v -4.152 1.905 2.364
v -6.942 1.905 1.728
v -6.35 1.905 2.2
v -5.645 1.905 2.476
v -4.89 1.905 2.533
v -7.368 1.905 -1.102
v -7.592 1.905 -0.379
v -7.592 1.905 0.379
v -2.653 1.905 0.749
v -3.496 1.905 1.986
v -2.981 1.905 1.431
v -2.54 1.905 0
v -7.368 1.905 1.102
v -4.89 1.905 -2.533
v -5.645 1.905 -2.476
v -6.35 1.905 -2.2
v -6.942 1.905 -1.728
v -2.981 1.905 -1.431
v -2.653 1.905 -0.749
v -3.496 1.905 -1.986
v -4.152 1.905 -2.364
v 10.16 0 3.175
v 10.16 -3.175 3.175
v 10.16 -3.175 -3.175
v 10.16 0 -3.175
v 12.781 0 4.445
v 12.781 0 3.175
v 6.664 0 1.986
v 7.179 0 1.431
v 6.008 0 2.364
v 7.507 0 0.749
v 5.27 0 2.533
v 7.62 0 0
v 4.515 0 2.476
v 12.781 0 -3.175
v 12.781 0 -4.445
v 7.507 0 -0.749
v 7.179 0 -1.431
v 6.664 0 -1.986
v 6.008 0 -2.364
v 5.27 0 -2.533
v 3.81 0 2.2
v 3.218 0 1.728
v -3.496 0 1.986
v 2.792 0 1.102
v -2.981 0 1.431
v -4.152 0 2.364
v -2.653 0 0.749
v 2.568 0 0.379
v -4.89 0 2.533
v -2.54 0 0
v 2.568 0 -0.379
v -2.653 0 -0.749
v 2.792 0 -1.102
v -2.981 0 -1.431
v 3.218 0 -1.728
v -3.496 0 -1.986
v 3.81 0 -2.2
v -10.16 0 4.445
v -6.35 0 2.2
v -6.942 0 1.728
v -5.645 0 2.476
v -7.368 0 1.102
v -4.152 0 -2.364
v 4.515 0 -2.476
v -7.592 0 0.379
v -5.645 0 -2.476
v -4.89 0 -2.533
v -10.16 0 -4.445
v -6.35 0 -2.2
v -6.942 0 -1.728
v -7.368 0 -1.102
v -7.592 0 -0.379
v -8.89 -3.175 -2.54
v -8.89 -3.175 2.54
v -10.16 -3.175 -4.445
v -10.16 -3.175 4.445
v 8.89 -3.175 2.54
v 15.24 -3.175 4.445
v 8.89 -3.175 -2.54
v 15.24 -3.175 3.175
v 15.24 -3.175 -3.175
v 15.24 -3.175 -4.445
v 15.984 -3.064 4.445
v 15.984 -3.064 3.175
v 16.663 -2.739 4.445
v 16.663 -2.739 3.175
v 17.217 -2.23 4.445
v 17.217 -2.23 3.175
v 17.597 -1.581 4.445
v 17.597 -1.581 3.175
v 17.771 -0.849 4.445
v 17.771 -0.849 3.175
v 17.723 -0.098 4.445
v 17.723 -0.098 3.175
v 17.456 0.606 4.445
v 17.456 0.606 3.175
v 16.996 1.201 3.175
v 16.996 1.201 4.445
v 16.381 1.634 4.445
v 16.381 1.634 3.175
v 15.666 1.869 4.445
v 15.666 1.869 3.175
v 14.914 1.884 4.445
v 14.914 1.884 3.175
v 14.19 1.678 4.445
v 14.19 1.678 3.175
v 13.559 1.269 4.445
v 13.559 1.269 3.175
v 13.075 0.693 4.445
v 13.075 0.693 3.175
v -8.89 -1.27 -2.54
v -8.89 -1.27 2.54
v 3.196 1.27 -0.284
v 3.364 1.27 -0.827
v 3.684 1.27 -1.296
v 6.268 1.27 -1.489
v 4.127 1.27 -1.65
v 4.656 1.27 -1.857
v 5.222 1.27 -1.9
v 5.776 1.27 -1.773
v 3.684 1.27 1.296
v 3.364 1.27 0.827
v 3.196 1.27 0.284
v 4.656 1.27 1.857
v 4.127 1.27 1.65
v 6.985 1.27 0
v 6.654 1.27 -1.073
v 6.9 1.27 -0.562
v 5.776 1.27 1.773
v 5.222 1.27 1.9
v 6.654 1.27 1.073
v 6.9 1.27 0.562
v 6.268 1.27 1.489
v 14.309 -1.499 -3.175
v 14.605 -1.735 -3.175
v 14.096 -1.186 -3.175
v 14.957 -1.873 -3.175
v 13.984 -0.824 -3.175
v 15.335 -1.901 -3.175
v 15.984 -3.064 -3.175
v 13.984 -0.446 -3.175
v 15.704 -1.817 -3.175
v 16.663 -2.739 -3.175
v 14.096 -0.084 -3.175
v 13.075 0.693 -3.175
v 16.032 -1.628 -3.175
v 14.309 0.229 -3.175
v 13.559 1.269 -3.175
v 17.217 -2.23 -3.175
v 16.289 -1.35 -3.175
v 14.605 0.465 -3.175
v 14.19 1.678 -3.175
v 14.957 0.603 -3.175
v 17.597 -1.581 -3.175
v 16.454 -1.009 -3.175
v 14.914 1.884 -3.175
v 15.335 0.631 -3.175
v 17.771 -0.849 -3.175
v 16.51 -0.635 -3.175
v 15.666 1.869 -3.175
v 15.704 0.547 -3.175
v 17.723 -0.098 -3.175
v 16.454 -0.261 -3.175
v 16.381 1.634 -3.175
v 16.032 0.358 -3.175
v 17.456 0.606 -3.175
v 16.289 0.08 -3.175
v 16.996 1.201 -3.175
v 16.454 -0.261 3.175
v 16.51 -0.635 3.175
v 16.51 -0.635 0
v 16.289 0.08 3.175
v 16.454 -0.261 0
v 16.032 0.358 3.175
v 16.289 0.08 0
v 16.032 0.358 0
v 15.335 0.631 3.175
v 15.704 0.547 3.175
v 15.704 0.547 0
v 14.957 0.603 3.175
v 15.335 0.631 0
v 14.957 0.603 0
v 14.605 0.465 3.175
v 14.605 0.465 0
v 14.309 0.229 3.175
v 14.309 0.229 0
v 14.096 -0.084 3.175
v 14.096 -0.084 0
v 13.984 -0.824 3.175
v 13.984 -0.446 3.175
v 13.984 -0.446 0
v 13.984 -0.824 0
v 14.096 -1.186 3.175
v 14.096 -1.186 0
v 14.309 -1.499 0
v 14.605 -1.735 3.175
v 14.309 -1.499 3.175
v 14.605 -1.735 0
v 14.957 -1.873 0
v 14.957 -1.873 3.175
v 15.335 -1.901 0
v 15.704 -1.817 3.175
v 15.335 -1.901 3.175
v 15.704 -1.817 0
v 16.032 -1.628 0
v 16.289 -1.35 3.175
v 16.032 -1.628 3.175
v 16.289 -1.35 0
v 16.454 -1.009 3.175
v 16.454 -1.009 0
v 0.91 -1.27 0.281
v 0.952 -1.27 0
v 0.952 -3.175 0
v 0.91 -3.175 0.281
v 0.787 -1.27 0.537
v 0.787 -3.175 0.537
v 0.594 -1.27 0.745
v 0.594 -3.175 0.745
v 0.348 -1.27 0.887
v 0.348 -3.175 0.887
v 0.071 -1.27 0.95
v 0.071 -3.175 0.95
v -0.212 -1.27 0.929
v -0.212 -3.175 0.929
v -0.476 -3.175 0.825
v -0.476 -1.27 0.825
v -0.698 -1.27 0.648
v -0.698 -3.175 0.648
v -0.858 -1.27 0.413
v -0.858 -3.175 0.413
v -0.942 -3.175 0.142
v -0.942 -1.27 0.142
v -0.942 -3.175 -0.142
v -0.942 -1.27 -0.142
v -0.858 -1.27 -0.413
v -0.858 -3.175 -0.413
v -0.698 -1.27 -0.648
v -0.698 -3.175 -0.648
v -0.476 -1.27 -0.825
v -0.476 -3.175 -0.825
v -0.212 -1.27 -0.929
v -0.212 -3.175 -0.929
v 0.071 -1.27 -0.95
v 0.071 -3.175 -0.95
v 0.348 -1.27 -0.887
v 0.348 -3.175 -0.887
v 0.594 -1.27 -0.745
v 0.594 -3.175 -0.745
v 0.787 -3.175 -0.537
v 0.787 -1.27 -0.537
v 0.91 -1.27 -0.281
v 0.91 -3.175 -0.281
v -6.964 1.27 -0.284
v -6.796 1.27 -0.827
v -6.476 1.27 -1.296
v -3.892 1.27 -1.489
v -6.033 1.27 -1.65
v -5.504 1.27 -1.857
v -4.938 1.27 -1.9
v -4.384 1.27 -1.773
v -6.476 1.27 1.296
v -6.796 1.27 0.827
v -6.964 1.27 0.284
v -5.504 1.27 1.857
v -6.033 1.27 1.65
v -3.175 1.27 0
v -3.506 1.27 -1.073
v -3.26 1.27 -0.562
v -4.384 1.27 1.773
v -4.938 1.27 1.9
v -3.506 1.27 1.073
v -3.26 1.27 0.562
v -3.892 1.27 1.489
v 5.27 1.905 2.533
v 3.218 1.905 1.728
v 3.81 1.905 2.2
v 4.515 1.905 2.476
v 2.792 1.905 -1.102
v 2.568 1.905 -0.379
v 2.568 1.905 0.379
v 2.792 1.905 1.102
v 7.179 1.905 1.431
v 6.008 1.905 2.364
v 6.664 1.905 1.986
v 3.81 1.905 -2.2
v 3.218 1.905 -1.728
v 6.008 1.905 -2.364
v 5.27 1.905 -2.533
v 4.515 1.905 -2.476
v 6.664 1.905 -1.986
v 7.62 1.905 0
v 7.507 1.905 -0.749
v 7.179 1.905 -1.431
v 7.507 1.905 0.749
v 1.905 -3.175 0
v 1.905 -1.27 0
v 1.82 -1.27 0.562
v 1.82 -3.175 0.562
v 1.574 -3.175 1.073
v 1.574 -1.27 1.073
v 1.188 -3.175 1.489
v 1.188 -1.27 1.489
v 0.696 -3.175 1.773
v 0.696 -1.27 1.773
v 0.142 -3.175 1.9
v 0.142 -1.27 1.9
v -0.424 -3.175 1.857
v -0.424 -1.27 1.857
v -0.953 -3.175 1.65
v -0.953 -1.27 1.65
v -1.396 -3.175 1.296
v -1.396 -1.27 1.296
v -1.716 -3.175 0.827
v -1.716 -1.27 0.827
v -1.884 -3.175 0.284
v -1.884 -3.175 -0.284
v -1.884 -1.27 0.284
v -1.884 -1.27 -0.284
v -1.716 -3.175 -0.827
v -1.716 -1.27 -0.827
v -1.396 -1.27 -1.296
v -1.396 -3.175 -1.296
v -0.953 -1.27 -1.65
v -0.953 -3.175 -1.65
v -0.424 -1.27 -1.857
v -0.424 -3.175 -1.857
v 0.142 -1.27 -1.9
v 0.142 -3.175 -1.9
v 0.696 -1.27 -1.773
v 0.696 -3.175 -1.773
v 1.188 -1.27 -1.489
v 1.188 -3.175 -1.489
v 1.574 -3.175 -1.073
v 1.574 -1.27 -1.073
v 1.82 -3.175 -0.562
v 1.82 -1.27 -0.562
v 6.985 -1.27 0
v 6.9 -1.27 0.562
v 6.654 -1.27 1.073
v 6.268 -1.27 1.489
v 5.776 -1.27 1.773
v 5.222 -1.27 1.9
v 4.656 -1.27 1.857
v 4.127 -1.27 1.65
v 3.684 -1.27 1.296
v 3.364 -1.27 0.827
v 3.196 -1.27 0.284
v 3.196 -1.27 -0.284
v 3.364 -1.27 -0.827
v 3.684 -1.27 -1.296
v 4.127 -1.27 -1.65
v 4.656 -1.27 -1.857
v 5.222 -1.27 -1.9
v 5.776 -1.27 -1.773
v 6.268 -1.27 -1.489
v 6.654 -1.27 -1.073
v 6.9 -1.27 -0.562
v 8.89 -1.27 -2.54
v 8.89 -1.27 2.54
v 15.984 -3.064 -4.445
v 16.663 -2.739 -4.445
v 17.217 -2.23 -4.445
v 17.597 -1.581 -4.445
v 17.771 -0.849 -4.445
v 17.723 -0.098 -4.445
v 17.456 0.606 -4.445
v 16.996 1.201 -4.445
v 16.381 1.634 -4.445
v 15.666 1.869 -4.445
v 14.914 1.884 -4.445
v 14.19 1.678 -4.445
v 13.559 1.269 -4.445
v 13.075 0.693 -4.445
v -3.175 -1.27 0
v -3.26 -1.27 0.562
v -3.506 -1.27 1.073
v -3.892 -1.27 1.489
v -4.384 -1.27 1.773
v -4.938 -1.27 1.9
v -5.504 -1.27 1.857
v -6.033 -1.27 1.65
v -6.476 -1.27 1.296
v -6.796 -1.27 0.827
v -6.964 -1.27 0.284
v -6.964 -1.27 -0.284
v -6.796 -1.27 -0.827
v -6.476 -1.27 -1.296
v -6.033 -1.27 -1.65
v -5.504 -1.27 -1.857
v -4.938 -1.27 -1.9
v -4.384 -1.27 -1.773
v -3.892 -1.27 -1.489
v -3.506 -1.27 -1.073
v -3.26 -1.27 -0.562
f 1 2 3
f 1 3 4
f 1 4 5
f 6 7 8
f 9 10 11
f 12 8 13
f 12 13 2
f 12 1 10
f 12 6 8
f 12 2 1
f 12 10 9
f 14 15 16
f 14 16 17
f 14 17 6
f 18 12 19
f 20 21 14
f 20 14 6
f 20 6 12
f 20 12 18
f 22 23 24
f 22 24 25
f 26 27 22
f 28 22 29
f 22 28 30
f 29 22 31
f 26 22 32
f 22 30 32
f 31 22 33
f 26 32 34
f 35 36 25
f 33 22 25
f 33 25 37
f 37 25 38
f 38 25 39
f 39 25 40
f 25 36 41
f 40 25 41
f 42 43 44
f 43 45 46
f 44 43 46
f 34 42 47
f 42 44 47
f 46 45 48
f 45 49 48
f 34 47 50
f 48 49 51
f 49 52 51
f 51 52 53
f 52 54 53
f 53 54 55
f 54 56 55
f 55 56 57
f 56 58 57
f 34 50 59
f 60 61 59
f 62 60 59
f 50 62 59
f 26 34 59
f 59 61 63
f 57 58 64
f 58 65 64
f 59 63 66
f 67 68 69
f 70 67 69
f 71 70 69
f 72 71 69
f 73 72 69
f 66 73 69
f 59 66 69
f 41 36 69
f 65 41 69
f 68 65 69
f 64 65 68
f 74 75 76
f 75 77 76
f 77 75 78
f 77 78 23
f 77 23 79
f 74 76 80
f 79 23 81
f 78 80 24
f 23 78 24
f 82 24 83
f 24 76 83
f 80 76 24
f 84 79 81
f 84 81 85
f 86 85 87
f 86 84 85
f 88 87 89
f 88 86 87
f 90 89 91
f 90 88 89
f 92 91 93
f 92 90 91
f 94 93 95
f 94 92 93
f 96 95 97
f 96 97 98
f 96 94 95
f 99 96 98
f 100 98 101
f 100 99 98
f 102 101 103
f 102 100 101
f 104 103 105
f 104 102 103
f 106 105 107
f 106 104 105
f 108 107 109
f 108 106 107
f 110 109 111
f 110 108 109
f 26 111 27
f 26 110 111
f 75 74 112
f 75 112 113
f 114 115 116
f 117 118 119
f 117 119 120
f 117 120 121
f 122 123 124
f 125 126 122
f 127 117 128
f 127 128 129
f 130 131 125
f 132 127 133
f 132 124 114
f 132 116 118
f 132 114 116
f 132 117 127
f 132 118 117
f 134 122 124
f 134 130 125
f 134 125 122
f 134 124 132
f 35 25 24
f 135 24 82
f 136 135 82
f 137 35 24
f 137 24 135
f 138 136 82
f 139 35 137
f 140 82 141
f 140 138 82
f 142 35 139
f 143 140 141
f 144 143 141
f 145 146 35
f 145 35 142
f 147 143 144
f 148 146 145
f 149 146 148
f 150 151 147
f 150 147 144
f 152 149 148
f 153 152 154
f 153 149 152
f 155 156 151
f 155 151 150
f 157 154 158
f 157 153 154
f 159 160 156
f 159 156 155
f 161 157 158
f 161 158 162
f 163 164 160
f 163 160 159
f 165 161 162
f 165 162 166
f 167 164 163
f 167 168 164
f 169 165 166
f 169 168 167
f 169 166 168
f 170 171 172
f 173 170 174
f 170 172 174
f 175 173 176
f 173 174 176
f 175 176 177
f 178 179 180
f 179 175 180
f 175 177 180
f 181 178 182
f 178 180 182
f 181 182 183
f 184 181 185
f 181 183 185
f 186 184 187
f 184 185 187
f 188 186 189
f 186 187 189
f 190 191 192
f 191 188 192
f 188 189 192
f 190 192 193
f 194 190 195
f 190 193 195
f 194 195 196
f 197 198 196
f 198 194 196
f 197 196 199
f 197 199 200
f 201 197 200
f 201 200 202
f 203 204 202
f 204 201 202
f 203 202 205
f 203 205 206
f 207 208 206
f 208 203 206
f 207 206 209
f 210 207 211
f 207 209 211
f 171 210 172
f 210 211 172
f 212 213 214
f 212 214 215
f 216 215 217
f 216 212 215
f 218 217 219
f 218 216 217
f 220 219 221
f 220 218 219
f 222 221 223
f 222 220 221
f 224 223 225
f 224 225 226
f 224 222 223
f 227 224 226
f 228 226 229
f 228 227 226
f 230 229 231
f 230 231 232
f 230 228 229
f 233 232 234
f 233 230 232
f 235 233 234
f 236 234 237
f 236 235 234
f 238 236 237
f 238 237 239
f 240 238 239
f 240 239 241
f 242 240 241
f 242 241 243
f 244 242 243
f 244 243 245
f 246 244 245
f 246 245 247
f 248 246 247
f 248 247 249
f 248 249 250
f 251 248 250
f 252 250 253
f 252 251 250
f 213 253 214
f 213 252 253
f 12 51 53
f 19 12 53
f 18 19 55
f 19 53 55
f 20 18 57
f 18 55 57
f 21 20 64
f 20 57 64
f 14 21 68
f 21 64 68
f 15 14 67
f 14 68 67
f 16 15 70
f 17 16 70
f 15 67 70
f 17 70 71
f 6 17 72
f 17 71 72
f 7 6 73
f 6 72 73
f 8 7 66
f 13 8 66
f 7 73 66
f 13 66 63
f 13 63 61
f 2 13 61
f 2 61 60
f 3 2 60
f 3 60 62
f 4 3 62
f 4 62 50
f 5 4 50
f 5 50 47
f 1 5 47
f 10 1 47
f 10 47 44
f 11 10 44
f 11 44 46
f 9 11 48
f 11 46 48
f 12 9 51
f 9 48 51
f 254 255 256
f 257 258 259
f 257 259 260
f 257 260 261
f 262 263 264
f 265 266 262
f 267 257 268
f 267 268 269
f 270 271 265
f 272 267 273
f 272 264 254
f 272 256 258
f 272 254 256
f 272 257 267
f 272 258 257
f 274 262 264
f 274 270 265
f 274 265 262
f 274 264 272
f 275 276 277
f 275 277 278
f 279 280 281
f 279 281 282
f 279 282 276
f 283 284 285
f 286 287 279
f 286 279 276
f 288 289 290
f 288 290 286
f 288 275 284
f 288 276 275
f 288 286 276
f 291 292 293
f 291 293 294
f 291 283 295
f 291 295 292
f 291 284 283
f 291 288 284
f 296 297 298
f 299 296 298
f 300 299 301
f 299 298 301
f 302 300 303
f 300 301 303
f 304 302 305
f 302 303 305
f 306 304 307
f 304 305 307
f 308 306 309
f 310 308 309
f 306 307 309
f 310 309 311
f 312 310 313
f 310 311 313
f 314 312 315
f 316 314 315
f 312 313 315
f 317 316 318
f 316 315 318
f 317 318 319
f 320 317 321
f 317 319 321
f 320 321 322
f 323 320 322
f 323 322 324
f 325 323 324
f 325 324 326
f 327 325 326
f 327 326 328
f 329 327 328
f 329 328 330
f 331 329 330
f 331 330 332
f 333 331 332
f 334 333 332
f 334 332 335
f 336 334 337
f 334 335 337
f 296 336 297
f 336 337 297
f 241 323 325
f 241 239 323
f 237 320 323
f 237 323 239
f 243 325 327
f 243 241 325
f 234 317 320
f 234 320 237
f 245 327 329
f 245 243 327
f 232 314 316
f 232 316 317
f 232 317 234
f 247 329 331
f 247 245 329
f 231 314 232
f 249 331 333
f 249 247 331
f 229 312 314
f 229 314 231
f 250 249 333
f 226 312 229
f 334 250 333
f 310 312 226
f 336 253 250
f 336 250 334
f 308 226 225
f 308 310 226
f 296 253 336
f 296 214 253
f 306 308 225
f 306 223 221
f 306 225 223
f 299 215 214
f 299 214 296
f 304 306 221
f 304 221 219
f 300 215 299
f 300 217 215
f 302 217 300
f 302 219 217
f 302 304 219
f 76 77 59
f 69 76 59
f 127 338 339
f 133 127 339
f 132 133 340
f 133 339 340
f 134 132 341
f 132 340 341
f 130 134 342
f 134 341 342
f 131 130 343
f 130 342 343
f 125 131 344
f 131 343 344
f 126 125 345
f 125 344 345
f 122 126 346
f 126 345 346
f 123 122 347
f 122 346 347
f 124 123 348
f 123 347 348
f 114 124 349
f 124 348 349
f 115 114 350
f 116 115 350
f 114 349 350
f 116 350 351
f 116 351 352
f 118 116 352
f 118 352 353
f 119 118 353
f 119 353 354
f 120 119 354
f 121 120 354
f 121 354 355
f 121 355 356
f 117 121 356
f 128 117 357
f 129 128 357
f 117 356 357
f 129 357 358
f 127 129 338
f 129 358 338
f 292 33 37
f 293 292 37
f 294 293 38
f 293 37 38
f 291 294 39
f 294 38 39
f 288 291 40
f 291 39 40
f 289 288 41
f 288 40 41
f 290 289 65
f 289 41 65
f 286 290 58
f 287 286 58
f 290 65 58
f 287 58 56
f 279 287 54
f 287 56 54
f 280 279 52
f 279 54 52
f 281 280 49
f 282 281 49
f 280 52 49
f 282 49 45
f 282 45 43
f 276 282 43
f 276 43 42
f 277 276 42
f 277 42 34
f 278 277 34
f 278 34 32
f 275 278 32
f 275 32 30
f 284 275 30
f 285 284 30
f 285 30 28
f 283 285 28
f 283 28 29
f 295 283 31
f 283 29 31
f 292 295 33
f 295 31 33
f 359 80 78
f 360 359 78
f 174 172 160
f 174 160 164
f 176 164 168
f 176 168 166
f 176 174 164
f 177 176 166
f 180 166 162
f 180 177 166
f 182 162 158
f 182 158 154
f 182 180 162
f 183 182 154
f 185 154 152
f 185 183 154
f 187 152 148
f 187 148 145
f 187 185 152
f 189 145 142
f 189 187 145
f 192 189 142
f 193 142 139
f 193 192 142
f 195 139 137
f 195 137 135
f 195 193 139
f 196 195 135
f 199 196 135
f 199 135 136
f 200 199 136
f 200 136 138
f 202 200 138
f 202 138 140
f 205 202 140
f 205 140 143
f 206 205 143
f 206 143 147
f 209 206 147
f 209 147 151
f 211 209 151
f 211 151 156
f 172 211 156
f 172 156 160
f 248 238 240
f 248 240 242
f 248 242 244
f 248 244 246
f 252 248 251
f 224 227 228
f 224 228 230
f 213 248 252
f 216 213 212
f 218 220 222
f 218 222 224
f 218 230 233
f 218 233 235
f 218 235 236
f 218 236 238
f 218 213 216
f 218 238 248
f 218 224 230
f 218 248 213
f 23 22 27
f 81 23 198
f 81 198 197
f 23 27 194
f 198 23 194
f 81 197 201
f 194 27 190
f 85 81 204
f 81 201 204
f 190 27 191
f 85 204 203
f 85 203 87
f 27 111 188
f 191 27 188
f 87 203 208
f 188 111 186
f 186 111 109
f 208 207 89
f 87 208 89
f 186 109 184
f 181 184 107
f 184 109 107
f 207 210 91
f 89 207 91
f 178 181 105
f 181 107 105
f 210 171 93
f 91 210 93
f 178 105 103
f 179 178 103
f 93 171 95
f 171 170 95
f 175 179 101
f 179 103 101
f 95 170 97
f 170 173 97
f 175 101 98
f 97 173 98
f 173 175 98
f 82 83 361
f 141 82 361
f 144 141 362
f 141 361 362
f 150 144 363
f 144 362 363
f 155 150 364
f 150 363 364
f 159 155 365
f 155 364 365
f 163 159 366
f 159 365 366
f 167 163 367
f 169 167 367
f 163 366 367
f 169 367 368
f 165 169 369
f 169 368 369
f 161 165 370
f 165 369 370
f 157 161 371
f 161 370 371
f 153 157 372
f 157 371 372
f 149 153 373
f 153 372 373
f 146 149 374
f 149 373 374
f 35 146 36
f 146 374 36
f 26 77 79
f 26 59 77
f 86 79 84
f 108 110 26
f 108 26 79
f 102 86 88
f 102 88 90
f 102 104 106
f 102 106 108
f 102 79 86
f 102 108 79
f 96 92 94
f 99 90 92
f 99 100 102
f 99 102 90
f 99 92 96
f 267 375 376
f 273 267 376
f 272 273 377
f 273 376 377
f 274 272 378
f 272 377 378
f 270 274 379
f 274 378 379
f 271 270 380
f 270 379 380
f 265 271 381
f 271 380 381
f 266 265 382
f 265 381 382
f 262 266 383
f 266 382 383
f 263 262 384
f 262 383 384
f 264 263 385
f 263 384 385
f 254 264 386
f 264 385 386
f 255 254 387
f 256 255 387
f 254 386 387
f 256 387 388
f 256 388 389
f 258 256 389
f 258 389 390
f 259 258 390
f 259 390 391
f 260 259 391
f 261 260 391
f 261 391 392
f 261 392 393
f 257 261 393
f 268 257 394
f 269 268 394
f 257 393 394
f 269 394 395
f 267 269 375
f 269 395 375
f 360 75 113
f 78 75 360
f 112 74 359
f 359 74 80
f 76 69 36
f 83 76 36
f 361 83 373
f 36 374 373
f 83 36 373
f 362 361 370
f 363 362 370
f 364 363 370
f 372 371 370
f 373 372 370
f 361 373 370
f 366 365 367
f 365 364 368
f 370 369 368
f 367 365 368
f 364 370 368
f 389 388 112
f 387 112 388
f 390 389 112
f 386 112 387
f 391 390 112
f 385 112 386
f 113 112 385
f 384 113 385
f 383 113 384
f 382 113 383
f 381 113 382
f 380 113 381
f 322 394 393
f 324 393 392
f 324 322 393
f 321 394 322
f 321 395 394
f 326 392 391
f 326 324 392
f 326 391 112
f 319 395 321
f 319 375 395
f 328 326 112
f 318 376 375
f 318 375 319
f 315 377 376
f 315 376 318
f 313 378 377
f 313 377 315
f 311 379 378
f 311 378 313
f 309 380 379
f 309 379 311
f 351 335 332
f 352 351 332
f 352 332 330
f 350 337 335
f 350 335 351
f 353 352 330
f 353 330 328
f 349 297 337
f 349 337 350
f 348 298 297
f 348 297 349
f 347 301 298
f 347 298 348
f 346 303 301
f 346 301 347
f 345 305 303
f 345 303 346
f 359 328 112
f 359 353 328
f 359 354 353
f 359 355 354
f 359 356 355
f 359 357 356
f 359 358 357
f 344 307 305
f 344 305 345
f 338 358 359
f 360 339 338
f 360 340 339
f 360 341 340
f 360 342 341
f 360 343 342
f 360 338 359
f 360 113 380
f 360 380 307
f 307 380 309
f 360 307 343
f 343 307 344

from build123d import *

# Parameters (mm, degrees)
SKETCH1_W                       = 20.32
SKETCH1_H                       = 3.175
BOSS_EXTRUDE2_DEPTH             = 4.445
SKETCH3_R                       = 2.54
BOSS_EXTRUDE3_DEPTH             = 1.905
SKETCH4_W                       = 17.78
SKETCH4_H                       = 5.08
CUT_EXTRUDE1_DEPTH              = 1.905
SKETCH5_R                       = 1.905
CUT_EXTRUDE2_DEPTH              = 2.54
SKETCH6_R                       = 1.905
SKETCH6_R_2                     = 0.9525
BOSS_EXTRUDE4_DEPTH             = 1.905
BOSS_EXTRUDE5_DEPTH             = 1.27
BOSS_EXTRUDE6_REACH             = 6.445
SKETCH9_R                       = 1.27
BOSS_EXTRUDE6_DIRECTION_2_REACH = 6.445


with BuildPart() as part:
    # Sketch1 → Boss-Extrude2 (new body, symmetric)
    with BuildSketch(Plane.XY):
        with Locations((0, -1.5875)):
            Rectangle(SKETCH1_W, SKETCH1_H)
    extrude(amount=BOSS_EXTRUDE2_DEPTH, both=True)

    # Sketch3 → Boss-Extrude3 (add)
    with BuildSketch(Plane(origin=(0, 0, 0), x_dir=(1, 0, 0), z_dir=(0, 1, 0))):
        with Locations((-5.08, 0)):
            Circle(SKETCH3_R)
        with Locations((5.08, 0)):
            Circle(SKETCH3_R)
    extrude(amount=BOSS_EXTRUDE3_DEPTH)

    # Sketch4 → Cut-Extrude1 (cut)
    with BuildSketch(Plane.XZ.offset(3.175)):
        Rectangle(SKETCH4_W, SKETCH4_H)
    extrude(amount=-CUT_EXTRUDE1_DEPTH, mode=Mode.SUBTRACT)

    # Sketch5 → Cut-Extrude2 (cut)
    with BuildSketch(Plane.XZ.offset(1.27)):
        with Locations((-5.08, 0)):
            Circle(SKETCH5_R)
        with Locations((5.08, 0)):
            Circle(SKETCH5_R)
    extrude(amount=-CUT_EXTRUDE2_DEPTH, mode=Mode.SUBTRACT)

    # Sketch6 → Boss-Extrude4 (add)
    with BuildSketch(Plane.XZ.offset(1.27)):
        Circle(SKETCH6_R)
        Circle(SKETCH6_R_2, mode=Mode.SUBTRACT)
    extrude(amount=BOSS_EXTRUDE4_DEPTH)

    # Sketch8 → Boss-Extrude5 (add)
    with BuildSketch(Plane.XY.offset(4.445)):
        with BuildLine():
            Line((10.16, -3.175), (15.24, -3.175))
            ThreePointArc((15.24, -3.175), (17.248046314, 0.920425987), (12.780655575, 0))
            Line((12.780655575, 0), (10.16, 0))
            Line((10.16, 0), (10.16, -3.175))
        make_face()
    boss_extrude5 = extrude(amount=-BOSS_EXTRUDE5_DEPTH)

    # Mirror1: Boss-Extrude5 across plane
    add(boss_extrude5.mirror(Plane.XY))

    # Sketch9 → Boss-Extrude6 (add, up to next)
    with BuildSketch(Plane.XY, mode=Mode.PRIVATE) as boss_extrude6_sk1:
        with Locations((15.24, -0.635)):
            Circle(SKETCH9_R)
    boss_extrude6_tool1 = extrude(boss_extrude6_sk1.sketch, amount=BOSS_EXTRUDE6_REACH, mode=Mode.PRIVATE) - part.part
    add(boss_extrude6_tool1.solids().sort_by_distance((15.24, -0.635, 0))[0])

    # Sketch9 → Boss-Extrude6 direction 2 (add, up to next)
    with BuildSketch(Plane.XY, mode=Mode.PRIVATE) as boss_extrude6_direction_2_sk1:
        with Locations((15.24, -0.635)):
            Circle(SKETCH9_R)
    boss_extrude6_direction_2_tool1 = extrude(boss_extrude6_direction_2_sk1.sketch, amount=-BOSS_EXTRUDE6_DIRECTION_2_REACH, mode=Mode.PRIVATE) - part.part
    add(boss_extrude6_direction_2_tool1.solids().sort_by_distance((15.24, -0.635, 0))[0])


solid = part.part
